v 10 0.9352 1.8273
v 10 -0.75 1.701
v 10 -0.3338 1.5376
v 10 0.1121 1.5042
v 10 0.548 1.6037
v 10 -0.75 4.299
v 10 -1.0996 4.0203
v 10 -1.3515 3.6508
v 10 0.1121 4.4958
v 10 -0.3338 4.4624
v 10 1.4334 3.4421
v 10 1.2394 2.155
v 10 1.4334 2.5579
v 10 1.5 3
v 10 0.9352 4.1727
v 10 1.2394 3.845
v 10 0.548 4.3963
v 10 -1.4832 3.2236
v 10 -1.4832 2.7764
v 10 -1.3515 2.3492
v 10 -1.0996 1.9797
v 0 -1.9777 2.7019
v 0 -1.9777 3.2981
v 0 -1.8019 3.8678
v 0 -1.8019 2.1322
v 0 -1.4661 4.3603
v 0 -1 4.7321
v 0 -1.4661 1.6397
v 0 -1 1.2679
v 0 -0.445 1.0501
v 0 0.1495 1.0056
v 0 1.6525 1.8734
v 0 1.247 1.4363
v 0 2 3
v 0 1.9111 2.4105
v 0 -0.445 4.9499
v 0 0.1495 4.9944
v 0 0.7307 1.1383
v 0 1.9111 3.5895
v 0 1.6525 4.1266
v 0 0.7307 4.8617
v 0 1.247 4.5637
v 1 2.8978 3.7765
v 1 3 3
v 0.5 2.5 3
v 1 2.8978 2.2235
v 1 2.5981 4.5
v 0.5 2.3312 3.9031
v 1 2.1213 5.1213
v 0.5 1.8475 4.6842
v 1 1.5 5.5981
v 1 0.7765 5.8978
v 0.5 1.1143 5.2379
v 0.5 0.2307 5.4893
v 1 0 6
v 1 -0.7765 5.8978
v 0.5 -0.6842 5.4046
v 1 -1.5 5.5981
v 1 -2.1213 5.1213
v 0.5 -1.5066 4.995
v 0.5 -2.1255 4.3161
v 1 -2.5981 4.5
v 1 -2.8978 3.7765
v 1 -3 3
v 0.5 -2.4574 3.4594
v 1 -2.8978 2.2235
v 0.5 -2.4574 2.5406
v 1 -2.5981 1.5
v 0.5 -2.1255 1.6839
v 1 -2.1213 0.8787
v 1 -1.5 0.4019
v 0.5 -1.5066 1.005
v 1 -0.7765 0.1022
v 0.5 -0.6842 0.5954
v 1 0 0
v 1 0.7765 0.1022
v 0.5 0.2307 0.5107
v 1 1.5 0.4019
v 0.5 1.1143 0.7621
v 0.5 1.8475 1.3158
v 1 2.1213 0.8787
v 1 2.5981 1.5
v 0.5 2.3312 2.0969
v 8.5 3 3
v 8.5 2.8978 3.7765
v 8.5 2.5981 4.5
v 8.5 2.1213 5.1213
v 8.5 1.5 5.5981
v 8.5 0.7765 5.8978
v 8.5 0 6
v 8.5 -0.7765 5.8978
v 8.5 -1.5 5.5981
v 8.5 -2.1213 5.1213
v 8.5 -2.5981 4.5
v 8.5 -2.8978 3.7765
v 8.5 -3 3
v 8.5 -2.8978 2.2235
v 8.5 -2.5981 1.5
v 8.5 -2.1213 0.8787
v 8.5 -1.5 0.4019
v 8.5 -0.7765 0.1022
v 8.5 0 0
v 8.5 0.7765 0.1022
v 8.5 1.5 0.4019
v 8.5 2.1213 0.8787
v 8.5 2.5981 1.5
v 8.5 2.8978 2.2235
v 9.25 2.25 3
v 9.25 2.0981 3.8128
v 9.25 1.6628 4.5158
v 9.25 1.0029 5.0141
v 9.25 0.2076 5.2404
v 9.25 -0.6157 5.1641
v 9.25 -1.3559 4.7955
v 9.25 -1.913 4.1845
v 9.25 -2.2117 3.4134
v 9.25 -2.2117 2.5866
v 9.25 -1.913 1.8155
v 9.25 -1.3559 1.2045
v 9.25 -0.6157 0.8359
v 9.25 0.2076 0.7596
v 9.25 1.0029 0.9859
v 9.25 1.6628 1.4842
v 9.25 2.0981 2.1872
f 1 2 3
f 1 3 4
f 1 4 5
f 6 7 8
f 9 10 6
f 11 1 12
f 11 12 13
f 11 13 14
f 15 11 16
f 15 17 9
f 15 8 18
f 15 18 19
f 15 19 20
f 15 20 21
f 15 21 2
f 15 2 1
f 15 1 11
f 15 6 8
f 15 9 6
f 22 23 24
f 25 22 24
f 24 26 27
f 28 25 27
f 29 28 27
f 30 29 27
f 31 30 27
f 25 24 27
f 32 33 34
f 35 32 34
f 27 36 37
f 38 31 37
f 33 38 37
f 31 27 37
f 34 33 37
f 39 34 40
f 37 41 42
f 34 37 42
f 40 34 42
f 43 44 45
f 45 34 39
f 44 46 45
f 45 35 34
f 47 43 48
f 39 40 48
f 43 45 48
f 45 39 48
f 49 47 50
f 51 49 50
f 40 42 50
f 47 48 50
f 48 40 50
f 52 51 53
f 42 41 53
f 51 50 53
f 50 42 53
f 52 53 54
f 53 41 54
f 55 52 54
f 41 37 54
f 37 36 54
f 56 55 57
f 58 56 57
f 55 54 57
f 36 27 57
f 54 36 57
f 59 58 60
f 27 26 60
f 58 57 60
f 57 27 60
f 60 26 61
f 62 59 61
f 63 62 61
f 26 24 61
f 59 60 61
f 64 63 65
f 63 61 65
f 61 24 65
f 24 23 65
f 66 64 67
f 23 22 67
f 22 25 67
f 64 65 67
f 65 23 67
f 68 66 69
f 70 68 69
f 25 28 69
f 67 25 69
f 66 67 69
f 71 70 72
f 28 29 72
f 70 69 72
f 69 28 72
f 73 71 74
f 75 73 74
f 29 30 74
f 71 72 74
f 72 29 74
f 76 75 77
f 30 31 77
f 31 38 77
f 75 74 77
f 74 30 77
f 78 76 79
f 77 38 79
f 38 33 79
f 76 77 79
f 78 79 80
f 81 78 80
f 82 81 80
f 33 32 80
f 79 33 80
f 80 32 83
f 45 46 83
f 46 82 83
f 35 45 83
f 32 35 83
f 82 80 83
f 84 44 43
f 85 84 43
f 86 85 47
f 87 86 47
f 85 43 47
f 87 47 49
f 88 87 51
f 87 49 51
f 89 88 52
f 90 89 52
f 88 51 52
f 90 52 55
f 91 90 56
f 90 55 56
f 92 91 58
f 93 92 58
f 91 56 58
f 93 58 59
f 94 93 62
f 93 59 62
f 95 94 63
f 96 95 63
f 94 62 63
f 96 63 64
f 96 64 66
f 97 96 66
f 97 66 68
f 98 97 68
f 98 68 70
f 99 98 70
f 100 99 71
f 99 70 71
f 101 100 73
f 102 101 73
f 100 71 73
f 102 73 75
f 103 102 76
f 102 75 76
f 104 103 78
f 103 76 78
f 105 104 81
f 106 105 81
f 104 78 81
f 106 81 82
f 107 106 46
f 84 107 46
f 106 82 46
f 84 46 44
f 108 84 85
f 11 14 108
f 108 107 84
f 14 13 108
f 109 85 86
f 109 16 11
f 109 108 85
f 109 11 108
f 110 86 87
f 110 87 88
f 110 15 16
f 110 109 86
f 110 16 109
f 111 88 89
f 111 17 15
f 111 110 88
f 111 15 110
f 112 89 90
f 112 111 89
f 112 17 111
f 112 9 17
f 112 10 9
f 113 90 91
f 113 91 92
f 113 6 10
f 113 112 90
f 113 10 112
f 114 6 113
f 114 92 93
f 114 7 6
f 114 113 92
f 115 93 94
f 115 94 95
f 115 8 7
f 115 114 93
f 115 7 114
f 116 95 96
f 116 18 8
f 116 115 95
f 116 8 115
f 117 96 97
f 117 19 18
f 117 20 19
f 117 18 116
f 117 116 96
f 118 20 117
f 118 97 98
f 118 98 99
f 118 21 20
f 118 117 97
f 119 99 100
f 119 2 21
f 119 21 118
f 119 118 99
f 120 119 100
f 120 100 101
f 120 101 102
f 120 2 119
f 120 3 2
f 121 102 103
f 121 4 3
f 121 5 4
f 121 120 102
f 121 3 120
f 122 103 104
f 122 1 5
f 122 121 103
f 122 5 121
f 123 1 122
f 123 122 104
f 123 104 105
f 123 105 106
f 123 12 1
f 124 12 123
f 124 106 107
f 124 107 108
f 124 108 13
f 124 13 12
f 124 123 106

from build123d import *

# Parameters (mm, degrees)
F0_R     = 3
F1_DEPTH = 10
F2_SIZE  = 1.5
F3_SIZE  = 1


with BuildPart() as f1:
    # F0 (on Right) → F1 (new body)
    with BuildSketch(Plane.YZ):
        with Locations((0, 3)):
            Circle(F0_R)
    extrude(amount=F1_DEPTH)

    # F2
    f2_edges = [f1.edges().sort_by_distance(p)[0] for p in [
        (10, -3, 3),
    ]]
    chamfer(f2_edges, length=F2_SIZE)

    # F3
    f3_edges = [f1.edges().sort_by_distance(p)[0] for p in [
        (0, -3, 3),
    ]]
    chamfer(f3_edges, length=F3_SIZE)


solid = f1.part
